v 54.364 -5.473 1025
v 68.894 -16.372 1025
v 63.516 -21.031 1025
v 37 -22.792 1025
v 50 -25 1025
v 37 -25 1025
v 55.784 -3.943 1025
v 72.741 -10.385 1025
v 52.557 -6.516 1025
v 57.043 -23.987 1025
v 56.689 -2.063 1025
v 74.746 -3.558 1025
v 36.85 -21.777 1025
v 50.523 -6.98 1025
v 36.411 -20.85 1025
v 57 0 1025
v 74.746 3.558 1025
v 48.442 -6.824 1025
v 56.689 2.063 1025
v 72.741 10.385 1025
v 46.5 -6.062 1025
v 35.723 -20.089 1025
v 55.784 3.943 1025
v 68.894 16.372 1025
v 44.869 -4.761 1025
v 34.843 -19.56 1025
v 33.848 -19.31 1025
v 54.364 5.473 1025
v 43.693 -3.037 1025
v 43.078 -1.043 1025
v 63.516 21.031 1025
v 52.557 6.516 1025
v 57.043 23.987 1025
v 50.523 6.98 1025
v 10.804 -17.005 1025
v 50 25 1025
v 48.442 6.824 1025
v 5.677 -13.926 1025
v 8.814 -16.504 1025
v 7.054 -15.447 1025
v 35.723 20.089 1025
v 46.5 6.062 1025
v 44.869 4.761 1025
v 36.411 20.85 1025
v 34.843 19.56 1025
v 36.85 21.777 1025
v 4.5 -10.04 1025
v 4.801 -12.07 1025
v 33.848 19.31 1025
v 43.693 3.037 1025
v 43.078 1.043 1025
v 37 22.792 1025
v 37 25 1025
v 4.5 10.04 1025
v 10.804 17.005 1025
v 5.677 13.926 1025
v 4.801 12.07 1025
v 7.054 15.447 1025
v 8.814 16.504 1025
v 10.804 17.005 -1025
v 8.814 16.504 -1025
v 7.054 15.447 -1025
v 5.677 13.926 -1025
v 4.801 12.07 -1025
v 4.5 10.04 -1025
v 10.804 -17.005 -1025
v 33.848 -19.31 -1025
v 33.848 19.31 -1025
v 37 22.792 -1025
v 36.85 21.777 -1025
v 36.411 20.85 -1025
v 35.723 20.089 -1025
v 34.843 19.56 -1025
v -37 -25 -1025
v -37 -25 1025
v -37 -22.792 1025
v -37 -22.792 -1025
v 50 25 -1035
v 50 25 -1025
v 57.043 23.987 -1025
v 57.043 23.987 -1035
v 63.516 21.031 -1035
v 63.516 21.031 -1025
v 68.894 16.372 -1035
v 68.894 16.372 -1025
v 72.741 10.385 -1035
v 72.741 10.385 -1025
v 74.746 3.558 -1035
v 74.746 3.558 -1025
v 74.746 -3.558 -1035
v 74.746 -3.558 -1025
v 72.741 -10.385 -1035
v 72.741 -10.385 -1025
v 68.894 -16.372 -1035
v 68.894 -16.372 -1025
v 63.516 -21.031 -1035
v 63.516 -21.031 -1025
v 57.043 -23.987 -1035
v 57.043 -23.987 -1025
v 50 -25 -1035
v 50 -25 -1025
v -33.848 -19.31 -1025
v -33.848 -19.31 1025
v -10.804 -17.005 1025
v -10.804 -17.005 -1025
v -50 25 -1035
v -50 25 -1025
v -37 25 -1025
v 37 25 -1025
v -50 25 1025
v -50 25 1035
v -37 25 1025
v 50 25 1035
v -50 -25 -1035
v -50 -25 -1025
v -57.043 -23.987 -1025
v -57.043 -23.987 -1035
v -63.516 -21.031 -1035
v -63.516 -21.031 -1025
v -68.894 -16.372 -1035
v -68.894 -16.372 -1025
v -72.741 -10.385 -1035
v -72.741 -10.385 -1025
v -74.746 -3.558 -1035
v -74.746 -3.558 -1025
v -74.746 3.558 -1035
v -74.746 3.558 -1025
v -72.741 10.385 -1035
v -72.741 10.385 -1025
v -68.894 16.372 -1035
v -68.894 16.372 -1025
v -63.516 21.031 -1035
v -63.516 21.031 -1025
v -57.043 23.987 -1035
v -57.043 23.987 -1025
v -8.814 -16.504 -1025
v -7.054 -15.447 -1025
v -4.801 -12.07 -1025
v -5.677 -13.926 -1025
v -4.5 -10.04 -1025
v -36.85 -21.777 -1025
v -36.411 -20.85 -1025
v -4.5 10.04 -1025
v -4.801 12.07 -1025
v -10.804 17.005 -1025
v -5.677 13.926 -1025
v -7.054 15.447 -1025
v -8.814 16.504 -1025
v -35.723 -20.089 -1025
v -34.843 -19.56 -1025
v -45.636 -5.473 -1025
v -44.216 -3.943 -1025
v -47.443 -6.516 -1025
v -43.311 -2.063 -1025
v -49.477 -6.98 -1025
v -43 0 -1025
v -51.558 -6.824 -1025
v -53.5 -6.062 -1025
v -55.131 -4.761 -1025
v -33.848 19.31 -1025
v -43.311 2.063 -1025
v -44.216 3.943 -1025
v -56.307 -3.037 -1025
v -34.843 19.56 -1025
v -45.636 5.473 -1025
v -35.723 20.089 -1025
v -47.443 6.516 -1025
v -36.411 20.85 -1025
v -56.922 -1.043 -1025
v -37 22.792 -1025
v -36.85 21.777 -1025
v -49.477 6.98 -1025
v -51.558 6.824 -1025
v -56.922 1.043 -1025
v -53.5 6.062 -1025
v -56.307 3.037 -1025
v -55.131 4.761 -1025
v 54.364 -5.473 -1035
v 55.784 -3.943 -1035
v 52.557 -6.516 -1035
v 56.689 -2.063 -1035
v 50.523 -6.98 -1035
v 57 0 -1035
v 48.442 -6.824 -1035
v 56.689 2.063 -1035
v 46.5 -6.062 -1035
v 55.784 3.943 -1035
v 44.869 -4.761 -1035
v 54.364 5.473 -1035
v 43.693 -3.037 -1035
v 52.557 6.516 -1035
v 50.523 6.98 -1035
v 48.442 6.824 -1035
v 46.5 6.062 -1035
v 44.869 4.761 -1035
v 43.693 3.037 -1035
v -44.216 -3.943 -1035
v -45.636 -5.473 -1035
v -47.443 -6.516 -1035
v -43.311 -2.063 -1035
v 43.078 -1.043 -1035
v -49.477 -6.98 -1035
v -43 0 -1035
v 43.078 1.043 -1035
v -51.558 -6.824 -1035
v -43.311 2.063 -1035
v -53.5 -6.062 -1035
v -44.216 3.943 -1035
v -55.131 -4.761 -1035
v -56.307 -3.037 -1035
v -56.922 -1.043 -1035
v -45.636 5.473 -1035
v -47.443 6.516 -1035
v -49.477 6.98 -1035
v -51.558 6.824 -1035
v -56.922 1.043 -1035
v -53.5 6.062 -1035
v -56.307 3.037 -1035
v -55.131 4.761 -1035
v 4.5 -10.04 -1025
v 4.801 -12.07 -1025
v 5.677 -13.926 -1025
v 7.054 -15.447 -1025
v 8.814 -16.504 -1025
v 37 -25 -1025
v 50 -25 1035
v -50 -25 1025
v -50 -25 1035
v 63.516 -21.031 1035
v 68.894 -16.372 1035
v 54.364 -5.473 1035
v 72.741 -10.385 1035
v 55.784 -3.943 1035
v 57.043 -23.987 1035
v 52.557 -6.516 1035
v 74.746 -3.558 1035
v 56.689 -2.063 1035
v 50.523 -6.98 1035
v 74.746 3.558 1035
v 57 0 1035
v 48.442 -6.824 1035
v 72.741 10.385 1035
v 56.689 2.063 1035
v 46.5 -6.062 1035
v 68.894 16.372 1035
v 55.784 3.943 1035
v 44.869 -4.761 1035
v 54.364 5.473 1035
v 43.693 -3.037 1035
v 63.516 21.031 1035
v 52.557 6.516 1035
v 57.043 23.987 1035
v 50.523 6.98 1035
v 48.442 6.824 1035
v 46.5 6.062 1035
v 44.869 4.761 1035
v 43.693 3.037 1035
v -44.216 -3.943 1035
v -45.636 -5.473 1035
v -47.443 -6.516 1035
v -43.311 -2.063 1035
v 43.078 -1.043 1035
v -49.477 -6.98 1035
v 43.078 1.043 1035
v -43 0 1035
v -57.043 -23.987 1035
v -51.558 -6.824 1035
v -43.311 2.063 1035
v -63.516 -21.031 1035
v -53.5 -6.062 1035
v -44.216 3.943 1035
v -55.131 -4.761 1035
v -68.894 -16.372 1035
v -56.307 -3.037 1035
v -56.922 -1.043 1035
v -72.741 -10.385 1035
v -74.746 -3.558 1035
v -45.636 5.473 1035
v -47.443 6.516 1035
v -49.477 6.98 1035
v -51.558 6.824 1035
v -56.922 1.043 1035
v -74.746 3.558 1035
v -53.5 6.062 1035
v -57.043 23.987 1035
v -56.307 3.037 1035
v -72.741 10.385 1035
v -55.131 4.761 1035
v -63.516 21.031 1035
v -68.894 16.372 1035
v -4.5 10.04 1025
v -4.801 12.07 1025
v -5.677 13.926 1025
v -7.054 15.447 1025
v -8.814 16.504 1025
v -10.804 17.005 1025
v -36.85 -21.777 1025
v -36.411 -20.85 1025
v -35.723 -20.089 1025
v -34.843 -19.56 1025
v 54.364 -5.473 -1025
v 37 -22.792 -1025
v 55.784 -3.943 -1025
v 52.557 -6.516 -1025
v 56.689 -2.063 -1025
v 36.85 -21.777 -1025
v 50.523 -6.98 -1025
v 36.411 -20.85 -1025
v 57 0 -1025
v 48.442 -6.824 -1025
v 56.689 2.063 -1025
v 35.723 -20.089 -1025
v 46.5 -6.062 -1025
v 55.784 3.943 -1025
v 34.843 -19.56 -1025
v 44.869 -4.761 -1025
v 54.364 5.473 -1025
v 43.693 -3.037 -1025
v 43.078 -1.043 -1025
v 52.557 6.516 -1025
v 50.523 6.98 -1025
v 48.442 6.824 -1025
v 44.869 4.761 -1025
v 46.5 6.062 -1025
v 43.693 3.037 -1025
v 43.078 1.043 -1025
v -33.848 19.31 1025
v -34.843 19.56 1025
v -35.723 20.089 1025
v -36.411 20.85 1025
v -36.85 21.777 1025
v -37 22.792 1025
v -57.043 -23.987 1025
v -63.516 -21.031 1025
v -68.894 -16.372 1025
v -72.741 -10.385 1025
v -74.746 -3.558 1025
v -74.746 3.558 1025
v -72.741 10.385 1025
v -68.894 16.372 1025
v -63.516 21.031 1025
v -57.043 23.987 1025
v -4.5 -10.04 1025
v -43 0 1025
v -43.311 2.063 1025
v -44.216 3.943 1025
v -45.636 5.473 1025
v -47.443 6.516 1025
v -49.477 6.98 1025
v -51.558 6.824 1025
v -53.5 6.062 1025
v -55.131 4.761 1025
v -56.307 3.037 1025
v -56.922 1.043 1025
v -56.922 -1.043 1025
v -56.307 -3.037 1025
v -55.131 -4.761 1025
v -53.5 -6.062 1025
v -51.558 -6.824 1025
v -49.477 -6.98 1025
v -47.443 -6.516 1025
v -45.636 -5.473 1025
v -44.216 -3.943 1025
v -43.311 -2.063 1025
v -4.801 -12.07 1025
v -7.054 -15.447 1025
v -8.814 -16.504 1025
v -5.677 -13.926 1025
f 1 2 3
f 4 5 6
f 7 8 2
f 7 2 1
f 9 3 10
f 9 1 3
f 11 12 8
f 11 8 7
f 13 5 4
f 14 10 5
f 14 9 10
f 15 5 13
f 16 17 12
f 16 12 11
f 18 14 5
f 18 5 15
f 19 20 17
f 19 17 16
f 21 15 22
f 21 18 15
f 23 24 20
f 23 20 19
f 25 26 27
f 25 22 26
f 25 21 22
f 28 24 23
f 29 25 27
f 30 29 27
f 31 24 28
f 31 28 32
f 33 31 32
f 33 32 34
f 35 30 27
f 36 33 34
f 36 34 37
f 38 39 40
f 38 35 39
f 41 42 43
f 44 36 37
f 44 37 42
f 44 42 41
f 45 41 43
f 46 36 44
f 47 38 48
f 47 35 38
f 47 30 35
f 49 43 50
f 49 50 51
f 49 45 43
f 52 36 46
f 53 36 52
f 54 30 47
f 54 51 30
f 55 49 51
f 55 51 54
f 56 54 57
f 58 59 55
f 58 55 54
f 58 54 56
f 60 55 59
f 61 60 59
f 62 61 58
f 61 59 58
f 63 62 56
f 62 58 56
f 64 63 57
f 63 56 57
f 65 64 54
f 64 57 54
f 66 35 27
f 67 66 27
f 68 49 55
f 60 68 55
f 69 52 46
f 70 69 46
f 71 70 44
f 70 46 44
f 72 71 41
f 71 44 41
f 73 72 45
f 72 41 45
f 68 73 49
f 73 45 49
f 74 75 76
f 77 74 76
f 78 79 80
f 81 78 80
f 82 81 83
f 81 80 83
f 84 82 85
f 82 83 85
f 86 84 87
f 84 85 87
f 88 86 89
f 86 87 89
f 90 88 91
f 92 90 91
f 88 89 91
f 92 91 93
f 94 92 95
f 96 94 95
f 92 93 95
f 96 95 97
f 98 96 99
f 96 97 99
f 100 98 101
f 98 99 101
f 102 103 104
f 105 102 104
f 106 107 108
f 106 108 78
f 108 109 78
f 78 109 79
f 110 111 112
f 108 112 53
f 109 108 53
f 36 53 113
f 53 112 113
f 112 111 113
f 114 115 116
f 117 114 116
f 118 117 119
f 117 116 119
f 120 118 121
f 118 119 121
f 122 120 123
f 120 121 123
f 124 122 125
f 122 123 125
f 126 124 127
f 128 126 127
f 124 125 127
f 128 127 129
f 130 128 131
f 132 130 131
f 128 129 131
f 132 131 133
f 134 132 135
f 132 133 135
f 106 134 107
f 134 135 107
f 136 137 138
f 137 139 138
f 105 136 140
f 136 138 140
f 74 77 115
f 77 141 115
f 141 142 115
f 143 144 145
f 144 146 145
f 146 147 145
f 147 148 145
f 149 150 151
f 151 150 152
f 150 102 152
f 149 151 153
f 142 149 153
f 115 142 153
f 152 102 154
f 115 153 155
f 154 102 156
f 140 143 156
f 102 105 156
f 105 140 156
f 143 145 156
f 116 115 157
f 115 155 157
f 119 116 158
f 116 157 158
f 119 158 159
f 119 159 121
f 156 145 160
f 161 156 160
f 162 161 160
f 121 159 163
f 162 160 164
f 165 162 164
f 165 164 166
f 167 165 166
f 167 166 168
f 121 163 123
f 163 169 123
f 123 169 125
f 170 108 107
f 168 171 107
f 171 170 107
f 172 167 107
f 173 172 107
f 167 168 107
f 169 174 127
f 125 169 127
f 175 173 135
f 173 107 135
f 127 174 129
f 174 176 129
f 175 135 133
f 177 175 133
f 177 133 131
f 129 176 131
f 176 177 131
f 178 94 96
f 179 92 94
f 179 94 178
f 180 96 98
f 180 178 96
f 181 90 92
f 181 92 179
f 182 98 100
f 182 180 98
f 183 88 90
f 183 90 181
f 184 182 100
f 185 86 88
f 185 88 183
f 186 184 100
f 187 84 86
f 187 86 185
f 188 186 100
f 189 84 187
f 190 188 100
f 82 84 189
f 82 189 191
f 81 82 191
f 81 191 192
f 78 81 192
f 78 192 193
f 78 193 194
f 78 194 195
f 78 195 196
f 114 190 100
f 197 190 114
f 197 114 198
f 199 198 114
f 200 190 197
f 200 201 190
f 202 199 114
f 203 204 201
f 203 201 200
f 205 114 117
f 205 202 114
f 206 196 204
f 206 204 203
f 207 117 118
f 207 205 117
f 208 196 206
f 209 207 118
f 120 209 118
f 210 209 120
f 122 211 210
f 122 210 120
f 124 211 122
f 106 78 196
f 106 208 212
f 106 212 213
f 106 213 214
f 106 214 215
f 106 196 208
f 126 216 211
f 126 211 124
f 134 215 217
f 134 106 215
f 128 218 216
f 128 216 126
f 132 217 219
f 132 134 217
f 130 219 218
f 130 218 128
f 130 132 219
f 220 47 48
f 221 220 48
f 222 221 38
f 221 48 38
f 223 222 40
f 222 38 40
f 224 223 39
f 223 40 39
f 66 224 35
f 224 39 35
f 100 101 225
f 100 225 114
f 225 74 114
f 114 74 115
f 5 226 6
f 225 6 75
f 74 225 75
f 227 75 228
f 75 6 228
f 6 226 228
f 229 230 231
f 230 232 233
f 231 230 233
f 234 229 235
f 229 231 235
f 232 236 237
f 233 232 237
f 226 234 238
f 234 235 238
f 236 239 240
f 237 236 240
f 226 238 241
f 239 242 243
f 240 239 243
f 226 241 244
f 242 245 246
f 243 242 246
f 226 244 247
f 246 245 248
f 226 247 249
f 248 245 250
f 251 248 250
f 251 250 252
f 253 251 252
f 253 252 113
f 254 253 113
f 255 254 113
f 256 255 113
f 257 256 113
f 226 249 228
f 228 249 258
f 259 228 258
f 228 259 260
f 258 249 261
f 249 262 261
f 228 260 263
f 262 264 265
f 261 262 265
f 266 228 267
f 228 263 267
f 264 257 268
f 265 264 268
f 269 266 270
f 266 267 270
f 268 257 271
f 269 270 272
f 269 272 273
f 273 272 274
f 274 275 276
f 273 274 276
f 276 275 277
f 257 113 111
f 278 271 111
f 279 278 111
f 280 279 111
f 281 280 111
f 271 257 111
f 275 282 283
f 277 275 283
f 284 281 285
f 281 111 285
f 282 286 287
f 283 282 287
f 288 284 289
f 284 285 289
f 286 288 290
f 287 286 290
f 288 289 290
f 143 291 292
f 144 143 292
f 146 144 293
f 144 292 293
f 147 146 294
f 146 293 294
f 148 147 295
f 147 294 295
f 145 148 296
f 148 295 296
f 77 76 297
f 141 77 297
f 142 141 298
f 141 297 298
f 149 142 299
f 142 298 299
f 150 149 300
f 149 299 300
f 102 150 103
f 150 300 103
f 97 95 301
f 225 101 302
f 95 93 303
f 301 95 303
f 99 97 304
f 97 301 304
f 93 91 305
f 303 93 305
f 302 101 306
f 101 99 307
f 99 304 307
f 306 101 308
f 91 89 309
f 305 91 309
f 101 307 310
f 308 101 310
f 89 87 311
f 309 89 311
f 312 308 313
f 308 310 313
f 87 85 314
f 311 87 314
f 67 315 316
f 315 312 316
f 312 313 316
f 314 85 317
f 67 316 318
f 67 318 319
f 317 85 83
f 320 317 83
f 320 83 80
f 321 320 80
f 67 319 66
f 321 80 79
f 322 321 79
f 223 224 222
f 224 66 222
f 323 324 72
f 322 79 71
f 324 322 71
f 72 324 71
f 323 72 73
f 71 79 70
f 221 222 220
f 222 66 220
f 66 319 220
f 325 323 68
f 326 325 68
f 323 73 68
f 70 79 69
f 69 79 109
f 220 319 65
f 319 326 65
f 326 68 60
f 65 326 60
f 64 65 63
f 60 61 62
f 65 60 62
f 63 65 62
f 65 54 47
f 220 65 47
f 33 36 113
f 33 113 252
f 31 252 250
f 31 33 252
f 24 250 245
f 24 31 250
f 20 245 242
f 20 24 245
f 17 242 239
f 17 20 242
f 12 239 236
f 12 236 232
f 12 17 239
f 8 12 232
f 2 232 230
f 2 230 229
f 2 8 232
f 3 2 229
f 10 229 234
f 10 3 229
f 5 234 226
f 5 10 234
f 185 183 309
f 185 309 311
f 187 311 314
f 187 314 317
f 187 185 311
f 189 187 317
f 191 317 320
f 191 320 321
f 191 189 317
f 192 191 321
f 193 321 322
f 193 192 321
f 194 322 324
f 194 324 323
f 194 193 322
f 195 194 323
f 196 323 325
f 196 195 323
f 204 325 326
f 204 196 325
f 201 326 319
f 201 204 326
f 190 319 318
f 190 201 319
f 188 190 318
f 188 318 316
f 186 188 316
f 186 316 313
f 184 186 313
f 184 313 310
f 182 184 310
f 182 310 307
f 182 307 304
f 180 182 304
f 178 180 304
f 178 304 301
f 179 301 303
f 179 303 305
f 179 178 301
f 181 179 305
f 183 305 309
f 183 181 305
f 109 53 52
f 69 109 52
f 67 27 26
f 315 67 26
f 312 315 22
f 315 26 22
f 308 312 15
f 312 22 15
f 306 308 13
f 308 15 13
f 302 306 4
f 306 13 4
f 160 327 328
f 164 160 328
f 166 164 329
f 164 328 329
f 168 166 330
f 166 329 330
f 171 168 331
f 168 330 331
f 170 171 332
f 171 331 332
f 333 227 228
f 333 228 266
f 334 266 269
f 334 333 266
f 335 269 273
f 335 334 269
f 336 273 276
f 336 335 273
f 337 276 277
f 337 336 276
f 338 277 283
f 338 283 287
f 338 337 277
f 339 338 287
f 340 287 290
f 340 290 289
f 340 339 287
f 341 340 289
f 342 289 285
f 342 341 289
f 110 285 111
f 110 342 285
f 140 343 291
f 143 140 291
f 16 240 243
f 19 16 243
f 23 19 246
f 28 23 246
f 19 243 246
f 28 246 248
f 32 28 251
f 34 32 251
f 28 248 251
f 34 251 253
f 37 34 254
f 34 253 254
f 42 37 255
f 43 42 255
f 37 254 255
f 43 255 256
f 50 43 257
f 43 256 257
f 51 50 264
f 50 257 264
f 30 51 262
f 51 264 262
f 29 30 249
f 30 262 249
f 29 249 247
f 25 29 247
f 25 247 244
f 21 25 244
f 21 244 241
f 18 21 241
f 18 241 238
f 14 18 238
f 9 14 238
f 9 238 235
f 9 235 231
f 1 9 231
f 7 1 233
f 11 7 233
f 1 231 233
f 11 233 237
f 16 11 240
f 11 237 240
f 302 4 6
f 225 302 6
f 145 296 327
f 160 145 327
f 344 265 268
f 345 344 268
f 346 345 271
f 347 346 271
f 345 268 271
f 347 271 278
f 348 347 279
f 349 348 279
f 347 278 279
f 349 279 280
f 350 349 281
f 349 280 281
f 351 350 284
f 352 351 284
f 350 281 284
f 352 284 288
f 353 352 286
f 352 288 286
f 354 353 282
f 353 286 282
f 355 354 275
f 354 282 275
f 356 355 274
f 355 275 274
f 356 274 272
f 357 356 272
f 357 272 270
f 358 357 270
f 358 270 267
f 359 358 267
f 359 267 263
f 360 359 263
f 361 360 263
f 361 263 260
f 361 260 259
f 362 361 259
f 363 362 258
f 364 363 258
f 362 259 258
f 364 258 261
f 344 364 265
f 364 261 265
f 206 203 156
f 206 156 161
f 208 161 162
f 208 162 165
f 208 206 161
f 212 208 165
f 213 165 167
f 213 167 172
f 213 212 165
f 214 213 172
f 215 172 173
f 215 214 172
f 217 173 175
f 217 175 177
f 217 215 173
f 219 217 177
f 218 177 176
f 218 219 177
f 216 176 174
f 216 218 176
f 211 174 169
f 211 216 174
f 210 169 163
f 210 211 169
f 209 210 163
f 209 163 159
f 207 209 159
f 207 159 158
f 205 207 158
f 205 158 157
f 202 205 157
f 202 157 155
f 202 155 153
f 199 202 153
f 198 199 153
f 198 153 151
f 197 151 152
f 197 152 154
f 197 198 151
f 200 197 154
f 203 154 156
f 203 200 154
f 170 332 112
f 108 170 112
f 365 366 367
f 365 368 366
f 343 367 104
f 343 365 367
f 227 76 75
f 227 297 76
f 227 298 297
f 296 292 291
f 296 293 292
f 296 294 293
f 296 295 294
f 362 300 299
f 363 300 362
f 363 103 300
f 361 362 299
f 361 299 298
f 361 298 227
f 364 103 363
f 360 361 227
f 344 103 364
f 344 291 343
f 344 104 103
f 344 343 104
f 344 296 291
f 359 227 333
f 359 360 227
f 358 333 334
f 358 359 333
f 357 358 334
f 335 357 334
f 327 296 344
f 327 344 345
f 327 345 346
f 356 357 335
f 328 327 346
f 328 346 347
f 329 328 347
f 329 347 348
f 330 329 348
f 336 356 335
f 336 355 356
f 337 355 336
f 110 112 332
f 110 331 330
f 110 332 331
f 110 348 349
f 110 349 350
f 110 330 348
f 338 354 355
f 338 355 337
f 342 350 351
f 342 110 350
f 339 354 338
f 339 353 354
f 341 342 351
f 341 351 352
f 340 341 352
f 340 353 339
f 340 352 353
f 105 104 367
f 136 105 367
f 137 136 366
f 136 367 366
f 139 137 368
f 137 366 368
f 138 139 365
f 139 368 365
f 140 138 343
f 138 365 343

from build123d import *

# Parameters (mm, degrees)
MEMBER_5_1_DEPTH    = 2050
MEMBER_5_2_DEPTH    = 2050
EXTRUDE_1_DEPTH     = 10
SKETCH_14_R         = 7
CUT_EXTRUDE_1_DEPTH = 10


with BuildPart() as part:
    # 草图11 → Member 5_1 (new body)
    with BuildSketch(Plane(origin=(0, 0, 1025), x_dir=(1, 0, 0), z_dir=(0, 0, -1))):
        with BuildLine():
            Line((0, -25), (37, -25))
            Line((37, -25), (37, -22.792319516))
            ThreePointArc((37, -22.792319516), (36.095071711, -20.443787461), (33.848226964, -19.309685745))
            Line((33.848226964, -19.309685745), (10.803546073, -17.005458605))
            ThreePointArc((10.803546073, -17.005458605), (6.309856578, -14.737255173), (4.5, -10.040191063))
            Line((4.5, -10.040191063), (4.5, 10.040191063))
            ThreePointArc((4.5, 10.040191063), (6.309856578, 14.737255173), (10.803546073, 17.005458605))
            Line((10.803546073, 17.005458605), (33.848226964, 19.309685745))
            ThreePointArc((33.848226964, 19.309685745), (36.095071711, 20.443787461), (37, 22.792319516))
            Line((37, 22.792319516), (37, 25))
            Line((37, 25), (0, 25))
            Line((0, 25), (0, -25))
        make_face()
    extrude(amount=MEMBER_5_1_DEPTH)



with BuildPart() as body_2:
    # 草图12 → Member 5_2 (new body)
    with BuildSketch(Plane(origin=(0, 0, 1025), x_dir=(-1, 0, 0), z_dir=(0, 0, -1))):
        with BuildLine():
            Line((0, -25), (37, -25))
            Line((37, -25), (37, -22.792319516))
            ThreePointArc((37, -22.792319516), (36.095071711, -20.443787461), (33.848226964, -19.309685745))
            Line((33.848226964, -19.309685745), (10.803546073, -17.005458605))
            ThreePointArc((10.803546073, -17.005458605), (6.309856578, -14.737255173), (4.5, -10.040191063))
            Line((4.5, -10.040191063), (4.5, 10.040191063))
            ThreePointArc((4.5, 10.040191063), (6.309856578, 14.737255173), (10.803546073, 17.005458605))
            Line((10.803546073, 17.005458605), (33.848226964, 19.309685745))
            ThreePointArc((33.848226964, 19.309685745), (36.095071711, 20.443787461), (37, 22.792319516))
            Line((37, 22.792319516), (37, 25))
            Line((37, 25), (0, 25))
            Line((0, 25), (0, -25))
        make_face()
    extrude(amount=MEMBER_5_2_DEPTH)


with BuildPart() as part_1:
    add(part.part)

    add(body_2.part)  # 凸台-拉伸1 merges body 2
    # 草图13 → 凸台-拉伸1 (add)
    with BuildSketch(Plane.XY.offset(1025)):
        with BuildLine():
            Line((50, -25), (0, -25))
            Line((0, -25), (-50, -25))
            ThreePointArc((-50, -25), (-75, 0), (-50, 25))
            Line((-50, 25), (0, 25))
            Line((0, 25), (50, 25))
            ThreePointArc((50, 25), (75, 0), (50, -25))
        make_face()
    extrude_1 = extrude(amount=EXTRUDE_1_DEPTH)

    # 草图14 → 切除-拉伸1 (cut)
    with BuildSketch(Plane.XY.offset(1035)):
        with Locations((-50, 0)):
            Circle(SKETCH_14_R)
        with Locations((50, 0)):
            Circle(SKETCH_14_R)
    cut_extrude_1 = extrude(amount=-CUT_EXTRUDE_1_DEPTH, mode=Mode.SUBTRACT)

    # 镜向4: 凸台-拉伸1, 切除-拉伸1 across plane
    add(extrude_1.mirror(Plane.XY))
    add(cut_extrude_1.mirror(Plane.XY), mode=Mode.SUBTRACT)


solid = part_1.part
